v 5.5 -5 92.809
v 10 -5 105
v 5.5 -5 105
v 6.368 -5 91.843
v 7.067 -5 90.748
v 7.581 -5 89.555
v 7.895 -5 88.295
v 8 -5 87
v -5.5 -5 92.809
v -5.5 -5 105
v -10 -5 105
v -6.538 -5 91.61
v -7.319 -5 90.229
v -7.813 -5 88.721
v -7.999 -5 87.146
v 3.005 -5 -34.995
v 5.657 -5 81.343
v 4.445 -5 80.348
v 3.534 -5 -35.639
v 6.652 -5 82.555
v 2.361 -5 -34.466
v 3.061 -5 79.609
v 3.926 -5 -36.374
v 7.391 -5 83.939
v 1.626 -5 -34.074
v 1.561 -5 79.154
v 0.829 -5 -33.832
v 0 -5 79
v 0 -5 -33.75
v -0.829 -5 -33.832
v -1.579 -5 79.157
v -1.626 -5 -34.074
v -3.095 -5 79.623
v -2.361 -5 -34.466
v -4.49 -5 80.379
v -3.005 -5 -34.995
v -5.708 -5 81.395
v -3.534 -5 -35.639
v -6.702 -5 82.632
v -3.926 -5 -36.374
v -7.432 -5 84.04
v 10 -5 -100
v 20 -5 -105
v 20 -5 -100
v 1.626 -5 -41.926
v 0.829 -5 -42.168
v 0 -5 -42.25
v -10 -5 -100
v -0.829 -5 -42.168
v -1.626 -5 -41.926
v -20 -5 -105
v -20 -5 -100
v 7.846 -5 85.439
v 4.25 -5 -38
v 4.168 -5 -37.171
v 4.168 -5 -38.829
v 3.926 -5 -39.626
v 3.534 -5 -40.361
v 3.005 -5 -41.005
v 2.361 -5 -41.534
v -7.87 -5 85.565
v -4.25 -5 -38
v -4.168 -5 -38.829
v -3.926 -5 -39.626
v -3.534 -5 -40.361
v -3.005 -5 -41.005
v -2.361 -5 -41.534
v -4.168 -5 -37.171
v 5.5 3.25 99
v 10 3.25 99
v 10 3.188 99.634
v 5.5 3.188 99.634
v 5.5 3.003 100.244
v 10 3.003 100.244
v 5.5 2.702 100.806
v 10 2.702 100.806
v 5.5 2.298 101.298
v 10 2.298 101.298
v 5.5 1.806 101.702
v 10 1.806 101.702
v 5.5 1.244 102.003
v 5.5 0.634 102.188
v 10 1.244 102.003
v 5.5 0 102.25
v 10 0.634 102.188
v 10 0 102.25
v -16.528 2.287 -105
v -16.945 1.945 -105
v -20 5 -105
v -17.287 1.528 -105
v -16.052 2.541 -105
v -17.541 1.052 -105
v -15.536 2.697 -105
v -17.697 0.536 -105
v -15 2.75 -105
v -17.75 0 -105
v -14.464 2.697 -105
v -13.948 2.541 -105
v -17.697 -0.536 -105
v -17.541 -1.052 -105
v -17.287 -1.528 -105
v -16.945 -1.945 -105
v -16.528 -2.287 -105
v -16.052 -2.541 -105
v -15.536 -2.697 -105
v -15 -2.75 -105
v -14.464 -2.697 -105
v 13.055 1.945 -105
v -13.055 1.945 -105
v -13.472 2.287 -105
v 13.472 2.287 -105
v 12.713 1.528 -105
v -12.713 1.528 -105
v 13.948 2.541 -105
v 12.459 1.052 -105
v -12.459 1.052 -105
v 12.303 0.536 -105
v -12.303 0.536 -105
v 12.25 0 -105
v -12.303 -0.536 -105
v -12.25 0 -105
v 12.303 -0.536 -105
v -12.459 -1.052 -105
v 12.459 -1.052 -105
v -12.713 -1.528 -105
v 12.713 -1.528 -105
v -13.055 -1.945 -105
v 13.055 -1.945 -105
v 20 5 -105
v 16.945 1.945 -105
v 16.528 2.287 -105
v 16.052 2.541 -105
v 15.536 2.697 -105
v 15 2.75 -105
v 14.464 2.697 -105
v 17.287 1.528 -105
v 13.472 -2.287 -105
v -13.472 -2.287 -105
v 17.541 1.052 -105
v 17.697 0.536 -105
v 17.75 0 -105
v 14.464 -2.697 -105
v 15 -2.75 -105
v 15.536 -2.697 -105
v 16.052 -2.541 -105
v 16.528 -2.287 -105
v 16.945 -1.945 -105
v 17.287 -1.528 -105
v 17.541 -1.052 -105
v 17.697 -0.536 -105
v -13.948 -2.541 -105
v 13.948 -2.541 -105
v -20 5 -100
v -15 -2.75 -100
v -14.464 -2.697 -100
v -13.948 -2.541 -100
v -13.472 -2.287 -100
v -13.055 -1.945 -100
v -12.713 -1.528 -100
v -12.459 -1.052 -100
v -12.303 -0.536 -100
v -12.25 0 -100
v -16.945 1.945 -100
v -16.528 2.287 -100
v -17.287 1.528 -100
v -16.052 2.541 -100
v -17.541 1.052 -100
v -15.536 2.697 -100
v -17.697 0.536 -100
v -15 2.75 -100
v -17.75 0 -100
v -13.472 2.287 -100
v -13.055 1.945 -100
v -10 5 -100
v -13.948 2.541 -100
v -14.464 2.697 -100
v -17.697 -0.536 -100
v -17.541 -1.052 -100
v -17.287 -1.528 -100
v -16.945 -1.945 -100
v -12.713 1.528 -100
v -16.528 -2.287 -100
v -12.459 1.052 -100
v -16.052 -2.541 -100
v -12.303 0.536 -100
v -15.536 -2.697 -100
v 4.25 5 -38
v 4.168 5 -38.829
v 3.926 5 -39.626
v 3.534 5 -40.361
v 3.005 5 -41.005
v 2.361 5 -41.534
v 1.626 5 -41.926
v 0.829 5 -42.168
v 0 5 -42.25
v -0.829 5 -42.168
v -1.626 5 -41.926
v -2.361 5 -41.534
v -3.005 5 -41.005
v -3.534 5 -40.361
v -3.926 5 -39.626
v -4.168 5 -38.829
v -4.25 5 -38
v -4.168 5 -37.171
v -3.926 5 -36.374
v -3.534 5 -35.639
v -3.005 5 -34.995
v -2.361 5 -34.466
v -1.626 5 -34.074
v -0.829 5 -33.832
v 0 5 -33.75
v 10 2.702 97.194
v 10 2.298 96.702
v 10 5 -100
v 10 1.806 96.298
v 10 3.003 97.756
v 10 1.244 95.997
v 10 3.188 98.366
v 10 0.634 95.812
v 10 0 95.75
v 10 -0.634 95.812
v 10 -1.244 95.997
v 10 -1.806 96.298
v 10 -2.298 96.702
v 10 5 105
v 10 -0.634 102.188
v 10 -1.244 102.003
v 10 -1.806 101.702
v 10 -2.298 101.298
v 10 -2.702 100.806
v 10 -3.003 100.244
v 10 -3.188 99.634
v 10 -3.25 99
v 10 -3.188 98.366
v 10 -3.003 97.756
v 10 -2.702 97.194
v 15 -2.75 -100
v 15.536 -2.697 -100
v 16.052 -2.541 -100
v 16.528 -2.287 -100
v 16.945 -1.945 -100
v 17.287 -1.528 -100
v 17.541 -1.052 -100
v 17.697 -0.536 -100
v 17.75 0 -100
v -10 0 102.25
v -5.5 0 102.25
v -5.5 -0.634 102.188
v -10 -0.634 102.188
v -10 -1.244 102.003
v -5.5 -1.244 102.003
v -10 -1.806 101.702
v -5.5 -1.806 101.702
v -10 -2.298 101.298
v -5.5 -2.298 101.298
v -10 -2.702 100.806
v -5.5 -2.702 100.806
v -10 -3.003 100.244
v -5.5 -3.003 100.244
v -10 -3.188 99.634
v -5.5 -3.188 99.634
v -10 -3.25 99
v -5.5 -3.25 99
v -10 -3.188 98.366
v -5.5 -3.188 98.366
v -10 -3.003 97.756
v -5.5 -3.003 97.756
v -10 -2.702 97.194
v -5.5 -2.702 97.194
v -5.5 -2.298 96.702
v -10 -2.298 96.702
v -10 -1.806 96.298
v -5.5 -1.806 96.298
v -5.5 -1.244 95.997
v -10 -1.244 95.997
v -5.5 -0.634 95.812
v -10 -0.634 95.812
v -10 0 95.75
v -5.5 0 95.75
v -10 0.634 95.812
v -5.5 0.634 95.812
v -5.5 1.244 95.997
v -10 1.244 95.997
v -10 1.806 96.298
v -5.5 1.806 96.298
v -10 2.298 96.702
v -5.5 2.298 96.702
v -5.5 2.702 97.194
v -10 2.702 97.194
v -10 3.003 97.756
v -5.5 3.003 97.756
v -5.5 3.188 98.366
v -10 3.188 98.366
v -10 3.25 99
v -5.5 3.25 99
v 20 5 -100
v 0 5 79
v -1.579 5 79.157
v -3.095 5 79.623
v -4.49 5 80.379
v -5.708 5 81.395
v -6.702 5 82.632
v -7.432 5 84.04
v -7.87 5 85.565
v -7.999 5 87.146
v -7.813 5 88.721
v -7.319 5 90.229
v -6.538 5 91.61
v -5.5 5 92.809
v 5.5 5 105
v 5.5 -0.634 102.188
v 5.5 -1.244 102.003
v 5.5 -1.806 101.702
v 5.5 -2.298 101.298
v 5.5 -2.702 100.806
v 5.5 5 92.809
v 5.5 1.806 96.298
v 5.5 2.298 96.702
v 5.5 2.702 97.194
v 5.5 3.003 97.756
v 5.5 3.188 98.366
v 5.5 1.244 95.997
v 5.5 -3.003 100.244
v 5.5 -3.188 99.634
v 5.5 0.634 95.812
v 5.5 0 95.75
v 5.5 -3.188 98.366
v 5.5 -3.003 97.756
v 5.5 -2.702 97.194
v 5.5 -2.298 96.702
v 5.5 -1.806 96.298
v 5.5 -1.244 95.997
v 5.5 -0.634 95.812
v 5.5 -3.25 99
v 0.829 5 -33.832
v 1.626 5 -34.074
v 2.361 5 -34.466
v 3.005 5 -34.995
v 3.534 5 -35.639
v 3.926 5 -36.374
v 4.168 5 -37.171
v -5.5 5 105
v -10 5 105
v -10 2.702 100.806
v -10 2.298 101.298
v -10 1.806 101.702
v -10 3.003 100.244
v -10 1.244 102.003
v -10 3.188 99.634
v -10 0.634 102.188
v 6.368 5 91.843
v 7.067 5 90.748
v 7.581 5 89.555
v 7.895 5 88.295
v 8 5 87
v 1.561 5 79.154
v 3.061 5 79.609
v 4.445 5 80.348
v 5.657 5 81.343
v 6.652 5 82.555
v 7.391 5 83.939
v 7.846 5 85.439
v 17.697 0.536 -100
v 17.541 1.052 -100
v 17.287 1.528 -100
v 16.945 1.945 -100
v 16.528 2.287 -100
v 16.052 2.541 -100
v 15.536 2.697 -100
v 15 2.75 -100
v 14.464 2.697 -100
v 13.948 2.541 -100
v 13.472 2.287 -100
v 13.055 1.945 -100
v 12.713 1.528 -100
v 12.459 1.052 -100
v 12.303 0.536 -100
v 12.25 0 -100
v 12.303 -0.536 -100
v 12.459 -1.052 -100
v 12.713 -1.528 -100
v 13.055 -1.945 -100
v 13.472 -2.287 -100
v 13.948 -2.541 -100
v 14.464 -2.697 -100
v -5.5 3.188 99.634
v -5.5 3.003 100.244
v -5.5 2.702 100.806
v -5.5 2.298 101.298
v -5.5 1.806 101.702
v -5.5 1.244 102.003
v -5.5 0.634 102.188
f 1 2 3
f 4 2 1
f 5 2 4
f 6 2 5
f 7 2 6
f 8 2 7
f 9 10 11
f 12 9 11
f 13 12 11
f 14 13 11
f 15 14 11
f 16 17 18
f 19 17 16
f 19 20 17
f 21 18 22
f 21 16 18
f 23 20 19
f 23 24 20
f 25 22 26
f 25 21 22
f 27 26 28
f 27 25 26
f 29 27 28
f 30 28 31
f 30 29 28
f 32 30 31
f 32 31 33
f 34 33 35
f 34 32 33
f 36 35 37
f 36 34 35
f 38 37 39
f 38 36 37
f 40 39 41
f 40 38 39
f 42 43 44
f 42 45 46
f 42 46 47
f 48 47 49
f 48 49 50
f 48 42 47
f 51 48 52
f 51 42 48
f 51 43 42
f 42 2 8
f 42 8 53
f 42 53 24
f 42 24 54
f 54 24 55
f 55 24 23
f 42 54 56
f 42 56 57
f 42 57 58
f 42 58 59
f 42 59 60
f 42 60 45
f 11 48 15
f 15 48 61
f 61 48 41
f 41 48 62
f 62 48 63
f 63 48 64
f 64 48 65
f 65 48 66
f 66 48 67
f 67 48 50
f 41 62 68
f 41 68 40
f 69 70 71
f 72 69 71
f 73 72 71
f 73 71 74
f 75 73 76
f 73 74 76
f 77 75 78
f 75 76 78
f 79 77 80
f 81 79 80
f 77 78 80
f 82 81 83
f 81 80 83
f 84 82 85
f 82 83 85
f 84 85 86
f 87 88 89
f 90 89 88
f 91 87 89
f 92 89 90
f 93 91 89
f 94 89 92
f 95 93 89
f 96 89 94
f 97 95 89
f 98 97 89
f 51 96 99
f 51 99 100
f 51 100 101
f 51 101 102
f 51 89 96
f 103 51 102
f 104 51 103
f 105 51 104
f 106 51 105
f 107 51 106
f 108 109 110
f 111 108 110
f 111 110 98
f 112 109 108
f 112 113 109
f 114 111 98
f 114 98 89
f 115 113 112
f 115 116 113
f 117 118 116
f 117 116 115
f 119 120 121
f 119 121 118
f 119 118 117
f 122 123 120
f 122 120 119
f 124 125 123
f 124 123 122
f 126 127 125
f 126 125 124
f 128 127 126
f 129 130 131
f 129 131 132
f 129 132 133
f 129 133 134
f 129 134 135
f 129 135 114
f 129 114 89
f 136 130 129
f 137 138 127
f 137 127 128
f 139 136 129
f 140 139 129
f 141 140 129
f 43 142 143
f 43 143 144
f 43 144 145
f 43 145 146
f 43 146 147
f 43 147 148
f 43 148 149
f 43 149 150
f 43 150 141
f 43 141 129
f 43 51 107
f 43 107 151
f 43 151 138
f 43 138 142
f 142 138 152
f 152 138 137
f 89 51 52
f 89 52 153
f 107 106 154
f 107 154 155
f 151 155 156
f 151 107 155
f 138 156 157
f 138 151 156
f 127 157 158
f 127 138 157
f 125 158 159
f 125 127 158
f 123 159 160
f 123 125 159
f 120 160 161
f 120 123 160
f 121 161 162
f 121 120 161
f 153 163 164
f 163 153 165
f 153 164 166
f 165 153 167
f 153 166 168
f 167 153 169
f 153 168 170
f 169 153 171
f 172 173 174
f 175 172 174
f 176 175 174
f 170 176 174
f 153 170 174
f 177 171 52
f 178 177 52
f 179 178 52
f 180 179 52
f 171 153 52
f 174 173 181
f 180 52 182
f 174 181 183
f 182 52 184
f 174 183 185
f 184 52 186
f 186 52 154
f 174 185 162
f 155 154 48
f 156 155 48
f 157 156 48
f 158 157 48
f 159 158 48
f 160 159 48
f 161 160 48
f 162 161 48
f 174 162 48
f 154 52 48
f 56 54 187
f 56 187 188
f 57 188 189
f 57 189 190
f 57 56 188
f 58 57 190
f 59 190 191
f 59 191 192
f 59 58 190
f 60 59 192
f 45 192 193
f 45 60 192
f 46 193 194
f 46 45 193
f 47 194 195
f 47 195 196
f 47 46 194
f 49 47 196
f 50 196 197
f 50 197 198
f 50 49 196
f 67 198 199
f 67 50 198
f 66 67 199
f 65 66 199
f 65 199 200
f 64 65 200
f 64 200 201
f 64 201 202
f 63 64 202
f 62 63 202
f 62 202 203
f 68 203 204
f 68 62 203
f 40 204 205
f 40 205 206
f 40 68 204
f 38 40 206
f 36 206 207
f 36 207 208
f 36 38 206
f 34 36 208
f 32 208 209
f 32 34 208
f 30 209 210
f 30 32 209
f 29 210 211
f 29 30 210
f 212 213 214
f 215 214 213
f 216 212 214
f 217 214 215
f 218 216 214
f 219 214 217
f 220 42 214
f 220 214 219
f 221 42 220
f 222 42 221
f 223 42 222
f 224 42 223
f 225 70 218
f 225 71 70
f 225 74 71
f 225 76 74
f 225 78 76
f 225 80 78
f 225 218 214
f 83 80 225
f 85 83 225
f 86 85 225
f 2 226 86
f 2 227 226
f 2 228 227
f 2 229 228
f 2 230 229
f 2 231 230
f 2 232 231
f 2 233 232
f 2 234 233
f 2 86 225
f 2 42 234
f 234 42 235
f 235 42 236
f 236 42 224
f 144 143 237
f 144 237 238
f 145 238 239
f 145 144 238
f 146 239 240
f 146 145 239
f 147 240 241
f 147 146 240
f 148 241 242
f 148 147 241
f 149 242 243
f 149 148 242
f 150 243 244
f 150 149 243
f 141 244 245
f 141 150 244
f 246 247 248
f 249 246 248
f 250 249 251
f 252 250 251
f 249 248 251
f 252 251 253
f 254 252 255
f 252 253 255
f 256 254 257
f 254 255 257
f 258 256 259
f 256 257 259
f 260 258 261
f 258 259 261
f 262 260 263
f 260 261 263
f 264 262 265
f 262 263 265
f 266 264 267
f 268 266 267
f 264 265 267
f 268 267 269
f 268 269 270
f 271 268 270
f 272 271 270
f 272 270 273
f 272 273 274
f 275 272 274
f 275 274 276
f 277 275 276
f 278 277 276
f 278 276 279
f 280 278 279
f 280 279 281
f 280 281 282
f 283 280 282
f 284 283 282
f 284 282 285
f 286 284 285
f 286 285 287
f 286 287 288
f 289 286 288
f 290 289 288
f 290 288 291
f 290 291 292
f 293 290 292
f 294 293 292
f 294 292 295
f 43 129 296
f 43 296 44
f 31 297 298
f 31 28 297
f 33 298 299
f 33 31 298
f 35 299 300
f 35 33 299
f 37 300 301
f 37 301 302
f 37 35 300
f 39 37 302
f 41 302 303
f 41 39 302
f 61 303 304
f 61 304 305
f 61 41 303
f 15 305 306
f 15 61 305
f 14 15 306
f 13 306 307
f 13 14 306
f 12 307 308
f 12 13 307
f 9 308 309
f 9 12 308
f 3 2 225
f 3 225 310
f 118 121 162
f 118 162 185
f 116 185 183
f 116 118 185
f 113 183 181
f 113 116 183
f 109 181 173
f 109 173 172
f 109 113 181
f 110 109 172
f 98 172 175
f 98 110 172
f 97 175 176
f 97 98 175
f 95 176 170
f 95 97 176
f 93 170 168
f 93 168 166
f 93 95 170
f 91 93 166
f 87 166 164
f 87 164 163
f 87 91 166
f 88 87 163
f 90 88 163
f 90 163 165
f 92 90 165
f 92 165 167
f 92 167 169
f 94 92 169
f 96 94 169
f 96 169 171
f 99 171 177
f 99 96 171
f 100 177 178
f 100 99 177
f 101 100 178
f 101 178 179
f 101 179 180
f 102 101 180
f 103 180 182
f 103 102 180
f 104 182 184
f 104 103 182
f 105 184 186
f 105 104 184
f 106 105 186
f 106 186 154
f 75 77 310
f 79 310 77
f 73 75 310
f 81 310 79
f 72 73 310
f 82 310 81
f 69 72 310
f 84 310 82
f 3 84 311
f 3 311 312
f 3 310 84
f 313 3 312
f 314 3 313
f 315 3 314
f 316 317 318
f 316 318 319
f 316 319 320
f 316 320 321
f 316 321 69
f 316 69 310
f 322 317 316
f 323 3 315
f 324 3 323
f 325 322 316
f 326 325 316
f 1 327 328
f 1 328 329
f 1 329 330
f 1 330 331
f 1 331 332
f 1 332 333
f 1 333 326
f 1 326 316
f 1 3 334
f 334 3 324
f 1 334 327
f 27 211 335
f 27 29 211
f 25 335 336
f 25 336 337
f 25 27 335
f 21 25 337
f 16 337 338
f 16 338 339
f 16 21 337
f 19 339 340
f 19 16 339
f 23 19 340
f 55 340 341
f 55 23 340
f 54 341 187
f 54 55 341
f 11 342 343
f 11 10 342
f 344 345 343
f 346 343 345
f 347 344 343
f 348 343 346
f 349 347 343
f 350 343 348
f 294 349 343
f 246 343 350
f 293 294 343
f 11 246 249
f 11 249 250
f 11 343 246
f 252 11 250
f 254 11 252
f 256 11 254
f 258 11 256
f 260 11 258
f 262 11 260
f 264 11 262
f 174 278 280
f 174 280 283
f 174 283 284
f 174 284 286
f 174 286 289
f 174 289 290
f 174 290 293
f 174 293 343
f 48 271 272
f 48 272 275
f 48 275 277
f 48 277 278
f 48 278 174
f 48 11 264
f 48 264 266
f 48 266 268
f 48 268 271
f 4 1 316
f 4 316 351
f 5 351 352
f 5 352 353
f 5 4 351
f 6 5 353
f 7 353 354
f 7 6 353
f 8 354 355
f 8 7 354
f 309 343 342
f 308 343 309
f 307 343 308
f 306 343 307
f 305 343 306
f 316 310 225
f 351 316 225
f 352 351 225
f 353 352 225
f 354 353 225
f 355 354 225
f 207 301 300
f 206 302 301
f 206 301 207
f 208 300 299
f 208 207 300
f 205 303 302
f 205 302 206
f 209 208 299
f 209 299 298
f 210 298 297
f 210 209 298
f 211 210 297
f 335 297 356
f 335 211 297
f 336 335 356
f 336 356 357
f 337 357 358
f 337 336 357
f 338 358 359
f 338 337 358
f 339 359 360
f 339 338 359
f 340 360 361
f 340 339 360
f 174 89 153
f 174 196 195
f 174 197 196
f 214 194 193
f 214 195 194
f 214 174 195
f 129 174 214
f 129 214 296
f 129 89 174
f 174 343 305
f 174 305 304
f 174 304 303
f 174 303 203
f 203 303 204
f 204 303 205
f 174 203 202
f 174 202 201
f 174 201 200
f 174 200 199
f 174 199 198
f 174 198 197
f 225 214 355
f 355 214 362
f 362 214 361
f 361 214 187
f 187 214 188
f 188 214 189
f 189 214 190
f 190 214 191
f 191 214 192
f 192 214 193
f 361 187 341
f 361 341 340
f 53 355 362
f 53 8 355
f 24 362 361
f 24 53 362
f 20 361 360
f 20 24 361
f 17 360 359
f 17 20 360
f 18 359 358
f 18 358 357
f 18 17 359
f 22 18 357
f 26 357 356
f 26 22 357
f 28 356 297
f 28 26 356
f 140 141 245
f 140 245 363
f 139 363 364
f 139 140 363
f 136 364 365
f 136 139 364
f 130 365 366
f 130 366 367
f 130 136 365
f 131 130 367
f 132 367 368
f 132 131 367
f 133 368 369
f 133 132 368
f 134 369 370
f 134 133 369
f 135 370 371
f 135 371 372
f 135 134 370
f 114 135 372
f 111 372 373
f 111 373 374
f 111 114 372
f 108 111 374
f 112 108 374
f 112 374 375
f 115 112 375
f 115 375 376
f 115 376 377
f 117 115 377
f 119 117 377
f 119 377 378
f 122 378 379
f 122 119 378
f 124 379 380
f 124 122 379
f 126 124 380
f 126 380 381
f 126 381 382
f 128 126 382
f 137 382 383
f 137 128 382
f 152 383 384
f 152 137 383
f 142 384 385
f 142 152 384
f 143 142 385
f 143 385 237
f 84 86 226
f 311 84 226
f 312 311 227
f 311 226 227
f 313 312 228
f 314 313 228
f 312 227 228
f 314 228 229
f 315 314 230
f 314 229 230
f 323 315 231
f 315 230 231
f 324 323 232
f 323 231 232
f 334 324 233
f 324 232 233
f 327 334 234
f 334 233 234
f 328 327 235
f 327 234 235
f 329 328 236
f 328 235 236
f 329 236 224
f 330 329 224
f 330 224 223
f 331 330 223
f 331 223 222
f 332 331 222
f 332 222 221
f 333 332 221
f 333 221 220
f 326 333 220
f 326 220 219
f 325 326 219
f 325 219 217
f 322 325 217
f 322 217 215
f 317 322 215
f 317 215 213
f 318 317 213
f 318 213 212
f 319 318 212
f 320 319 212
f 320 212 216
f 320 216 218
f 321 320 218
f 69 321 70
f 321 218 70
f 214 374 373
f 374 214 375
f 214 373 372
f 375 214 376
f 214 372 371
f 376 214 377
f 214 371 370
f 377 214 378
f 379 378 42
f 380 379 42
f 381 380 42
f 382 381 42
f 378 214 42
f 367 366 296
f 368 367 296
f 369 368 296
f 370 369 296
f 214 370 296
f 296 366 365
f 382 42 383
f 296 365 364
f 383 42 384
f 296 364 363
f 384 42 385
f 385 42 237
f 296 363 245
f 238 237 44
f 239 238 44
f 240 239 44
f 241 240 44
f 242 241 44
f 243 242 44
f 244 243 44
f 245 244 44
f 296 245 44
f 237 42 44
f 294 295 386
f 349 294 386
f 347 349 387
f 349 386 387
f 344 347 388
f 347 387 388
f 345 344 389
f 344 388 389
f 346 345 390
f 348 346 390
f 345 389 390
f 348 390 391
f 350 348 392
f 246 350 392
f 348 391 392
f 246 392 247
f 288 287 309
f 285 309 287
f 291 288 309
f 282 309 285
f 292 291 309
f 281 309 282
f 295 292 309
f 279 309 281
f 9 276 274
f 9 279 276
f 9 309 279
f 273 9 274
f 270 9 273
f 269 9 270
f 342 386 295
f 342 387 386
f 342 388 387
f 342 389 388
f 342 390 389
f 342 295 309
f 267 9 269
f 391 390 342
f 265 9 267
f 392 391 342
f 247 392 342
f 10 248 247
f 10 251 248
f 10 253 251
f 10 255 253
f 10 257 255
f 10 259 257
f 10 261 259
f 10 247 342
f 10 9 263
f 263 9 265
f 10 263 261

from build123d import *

# Parameters (mm, degrees)
F1_DEPTH = 5
F3_DEPTH = 25
F5_DEPTH = 5


with BuildPart() as f1:
    # F0 (on Front) → F1 (new body, symmetric)
    with BuildSketch(Plane.XZ):
        with BuildLine():
            Line((-10, 105), (-10, -105))
            Line((-10, -105), (10, -105))
            Line((10, -105), (10, 105))
            Line((10, 105), (5.5, 105))
            Line((5.5, 105), (5.5, 92.809475))
            ThreePointArc((5.5, 92.809475), (7.348469, 90.162278), (8, 87))
            ThreePointArc((8, 87), (5.656854, 81.343146), (0, 79))
            ThreePointArc((0, 79), (-7.43222, 84.039916), (-5.5, 92.809475))
            Line((-5.5, 92.809475), (-5.5, 105))
            Line((-5.5, 105), (-10, 105))
        make_face()
        with BuildLine():
            ThreePointArc((4.25, -38), (-3.005204, -41.005204), (0, -33.75))
            ThreePointArc((0, -33.75), (3.005204, -34.994796), (4.25, -38))
        make_face(mode=Mode.SUBTRACT)
    extrude(amount=F1_DEPTH, both=True)

    # F2 (on face) → F3 (cut)
    with BuildSketch(Plane.YZ.offset(10)):
        with BuildLine():
            ThreePointArc((0, 102.25), (-2.298097, 96.701903), (3.25, 99))
            ThreePointArc((3.25, 99), (2.298097, 101.298097), (0, 102.25))
        make_face()
    extrude(amount=-F3_DEPTH, mode=Mode.SUBTRACT)

    # F4 (on face) → F5 (join)
    with BuildSketch(Plane(origin=(0, 0, -105), x_dir=(1, 0, 0), z_dir=(0, 0, -1))):
        with BuildLine():
            ThreePointArc((-12.25, 0), (-13.055456, 1.944544), (-15, 2.75))
            ThreePointArc((-15, 2.75), (-16.944544, -1.944544), (-12.25, 0))
        make_face()
        Polygon((-10, -5), (-10, 5), (-15, 5), (-20, 5), (-20, -5), align=None)
        with BuildLine():
            ThreePointArc((-12.25, 0), (-16.944544, -1.944544), (-15, 2.75))
            ThreePointArc((-15, 2.75), (-13.055456, 1.944544), (-12.25, 0))
        make_face(mode=Mode.SUBTRACT)
        with BuildLine():
            ThreePointArc((17.75, 0), (16.944544, 1.944544), (15, 2.75))
            ThreePointArc((15, 2.75), (13.055456, -1.944544), (17.75, 0))
        make_face()
        Polygon((15, 5), (10, 5), (10, -5), (20, -5), (20, 5), align=None)
        with BuildLine():
            ThreePointArc((17.75, 0), (13.055456, -1.944544), (15, 2.75))
            ThreePointArc((15, 2.75), (16.944544, 1.944544), (17.75, 0))
        make_face(mode=Mode.SUBTRACT)
    extrude(amount=-F5_DEPTH)


solid = f1.part
